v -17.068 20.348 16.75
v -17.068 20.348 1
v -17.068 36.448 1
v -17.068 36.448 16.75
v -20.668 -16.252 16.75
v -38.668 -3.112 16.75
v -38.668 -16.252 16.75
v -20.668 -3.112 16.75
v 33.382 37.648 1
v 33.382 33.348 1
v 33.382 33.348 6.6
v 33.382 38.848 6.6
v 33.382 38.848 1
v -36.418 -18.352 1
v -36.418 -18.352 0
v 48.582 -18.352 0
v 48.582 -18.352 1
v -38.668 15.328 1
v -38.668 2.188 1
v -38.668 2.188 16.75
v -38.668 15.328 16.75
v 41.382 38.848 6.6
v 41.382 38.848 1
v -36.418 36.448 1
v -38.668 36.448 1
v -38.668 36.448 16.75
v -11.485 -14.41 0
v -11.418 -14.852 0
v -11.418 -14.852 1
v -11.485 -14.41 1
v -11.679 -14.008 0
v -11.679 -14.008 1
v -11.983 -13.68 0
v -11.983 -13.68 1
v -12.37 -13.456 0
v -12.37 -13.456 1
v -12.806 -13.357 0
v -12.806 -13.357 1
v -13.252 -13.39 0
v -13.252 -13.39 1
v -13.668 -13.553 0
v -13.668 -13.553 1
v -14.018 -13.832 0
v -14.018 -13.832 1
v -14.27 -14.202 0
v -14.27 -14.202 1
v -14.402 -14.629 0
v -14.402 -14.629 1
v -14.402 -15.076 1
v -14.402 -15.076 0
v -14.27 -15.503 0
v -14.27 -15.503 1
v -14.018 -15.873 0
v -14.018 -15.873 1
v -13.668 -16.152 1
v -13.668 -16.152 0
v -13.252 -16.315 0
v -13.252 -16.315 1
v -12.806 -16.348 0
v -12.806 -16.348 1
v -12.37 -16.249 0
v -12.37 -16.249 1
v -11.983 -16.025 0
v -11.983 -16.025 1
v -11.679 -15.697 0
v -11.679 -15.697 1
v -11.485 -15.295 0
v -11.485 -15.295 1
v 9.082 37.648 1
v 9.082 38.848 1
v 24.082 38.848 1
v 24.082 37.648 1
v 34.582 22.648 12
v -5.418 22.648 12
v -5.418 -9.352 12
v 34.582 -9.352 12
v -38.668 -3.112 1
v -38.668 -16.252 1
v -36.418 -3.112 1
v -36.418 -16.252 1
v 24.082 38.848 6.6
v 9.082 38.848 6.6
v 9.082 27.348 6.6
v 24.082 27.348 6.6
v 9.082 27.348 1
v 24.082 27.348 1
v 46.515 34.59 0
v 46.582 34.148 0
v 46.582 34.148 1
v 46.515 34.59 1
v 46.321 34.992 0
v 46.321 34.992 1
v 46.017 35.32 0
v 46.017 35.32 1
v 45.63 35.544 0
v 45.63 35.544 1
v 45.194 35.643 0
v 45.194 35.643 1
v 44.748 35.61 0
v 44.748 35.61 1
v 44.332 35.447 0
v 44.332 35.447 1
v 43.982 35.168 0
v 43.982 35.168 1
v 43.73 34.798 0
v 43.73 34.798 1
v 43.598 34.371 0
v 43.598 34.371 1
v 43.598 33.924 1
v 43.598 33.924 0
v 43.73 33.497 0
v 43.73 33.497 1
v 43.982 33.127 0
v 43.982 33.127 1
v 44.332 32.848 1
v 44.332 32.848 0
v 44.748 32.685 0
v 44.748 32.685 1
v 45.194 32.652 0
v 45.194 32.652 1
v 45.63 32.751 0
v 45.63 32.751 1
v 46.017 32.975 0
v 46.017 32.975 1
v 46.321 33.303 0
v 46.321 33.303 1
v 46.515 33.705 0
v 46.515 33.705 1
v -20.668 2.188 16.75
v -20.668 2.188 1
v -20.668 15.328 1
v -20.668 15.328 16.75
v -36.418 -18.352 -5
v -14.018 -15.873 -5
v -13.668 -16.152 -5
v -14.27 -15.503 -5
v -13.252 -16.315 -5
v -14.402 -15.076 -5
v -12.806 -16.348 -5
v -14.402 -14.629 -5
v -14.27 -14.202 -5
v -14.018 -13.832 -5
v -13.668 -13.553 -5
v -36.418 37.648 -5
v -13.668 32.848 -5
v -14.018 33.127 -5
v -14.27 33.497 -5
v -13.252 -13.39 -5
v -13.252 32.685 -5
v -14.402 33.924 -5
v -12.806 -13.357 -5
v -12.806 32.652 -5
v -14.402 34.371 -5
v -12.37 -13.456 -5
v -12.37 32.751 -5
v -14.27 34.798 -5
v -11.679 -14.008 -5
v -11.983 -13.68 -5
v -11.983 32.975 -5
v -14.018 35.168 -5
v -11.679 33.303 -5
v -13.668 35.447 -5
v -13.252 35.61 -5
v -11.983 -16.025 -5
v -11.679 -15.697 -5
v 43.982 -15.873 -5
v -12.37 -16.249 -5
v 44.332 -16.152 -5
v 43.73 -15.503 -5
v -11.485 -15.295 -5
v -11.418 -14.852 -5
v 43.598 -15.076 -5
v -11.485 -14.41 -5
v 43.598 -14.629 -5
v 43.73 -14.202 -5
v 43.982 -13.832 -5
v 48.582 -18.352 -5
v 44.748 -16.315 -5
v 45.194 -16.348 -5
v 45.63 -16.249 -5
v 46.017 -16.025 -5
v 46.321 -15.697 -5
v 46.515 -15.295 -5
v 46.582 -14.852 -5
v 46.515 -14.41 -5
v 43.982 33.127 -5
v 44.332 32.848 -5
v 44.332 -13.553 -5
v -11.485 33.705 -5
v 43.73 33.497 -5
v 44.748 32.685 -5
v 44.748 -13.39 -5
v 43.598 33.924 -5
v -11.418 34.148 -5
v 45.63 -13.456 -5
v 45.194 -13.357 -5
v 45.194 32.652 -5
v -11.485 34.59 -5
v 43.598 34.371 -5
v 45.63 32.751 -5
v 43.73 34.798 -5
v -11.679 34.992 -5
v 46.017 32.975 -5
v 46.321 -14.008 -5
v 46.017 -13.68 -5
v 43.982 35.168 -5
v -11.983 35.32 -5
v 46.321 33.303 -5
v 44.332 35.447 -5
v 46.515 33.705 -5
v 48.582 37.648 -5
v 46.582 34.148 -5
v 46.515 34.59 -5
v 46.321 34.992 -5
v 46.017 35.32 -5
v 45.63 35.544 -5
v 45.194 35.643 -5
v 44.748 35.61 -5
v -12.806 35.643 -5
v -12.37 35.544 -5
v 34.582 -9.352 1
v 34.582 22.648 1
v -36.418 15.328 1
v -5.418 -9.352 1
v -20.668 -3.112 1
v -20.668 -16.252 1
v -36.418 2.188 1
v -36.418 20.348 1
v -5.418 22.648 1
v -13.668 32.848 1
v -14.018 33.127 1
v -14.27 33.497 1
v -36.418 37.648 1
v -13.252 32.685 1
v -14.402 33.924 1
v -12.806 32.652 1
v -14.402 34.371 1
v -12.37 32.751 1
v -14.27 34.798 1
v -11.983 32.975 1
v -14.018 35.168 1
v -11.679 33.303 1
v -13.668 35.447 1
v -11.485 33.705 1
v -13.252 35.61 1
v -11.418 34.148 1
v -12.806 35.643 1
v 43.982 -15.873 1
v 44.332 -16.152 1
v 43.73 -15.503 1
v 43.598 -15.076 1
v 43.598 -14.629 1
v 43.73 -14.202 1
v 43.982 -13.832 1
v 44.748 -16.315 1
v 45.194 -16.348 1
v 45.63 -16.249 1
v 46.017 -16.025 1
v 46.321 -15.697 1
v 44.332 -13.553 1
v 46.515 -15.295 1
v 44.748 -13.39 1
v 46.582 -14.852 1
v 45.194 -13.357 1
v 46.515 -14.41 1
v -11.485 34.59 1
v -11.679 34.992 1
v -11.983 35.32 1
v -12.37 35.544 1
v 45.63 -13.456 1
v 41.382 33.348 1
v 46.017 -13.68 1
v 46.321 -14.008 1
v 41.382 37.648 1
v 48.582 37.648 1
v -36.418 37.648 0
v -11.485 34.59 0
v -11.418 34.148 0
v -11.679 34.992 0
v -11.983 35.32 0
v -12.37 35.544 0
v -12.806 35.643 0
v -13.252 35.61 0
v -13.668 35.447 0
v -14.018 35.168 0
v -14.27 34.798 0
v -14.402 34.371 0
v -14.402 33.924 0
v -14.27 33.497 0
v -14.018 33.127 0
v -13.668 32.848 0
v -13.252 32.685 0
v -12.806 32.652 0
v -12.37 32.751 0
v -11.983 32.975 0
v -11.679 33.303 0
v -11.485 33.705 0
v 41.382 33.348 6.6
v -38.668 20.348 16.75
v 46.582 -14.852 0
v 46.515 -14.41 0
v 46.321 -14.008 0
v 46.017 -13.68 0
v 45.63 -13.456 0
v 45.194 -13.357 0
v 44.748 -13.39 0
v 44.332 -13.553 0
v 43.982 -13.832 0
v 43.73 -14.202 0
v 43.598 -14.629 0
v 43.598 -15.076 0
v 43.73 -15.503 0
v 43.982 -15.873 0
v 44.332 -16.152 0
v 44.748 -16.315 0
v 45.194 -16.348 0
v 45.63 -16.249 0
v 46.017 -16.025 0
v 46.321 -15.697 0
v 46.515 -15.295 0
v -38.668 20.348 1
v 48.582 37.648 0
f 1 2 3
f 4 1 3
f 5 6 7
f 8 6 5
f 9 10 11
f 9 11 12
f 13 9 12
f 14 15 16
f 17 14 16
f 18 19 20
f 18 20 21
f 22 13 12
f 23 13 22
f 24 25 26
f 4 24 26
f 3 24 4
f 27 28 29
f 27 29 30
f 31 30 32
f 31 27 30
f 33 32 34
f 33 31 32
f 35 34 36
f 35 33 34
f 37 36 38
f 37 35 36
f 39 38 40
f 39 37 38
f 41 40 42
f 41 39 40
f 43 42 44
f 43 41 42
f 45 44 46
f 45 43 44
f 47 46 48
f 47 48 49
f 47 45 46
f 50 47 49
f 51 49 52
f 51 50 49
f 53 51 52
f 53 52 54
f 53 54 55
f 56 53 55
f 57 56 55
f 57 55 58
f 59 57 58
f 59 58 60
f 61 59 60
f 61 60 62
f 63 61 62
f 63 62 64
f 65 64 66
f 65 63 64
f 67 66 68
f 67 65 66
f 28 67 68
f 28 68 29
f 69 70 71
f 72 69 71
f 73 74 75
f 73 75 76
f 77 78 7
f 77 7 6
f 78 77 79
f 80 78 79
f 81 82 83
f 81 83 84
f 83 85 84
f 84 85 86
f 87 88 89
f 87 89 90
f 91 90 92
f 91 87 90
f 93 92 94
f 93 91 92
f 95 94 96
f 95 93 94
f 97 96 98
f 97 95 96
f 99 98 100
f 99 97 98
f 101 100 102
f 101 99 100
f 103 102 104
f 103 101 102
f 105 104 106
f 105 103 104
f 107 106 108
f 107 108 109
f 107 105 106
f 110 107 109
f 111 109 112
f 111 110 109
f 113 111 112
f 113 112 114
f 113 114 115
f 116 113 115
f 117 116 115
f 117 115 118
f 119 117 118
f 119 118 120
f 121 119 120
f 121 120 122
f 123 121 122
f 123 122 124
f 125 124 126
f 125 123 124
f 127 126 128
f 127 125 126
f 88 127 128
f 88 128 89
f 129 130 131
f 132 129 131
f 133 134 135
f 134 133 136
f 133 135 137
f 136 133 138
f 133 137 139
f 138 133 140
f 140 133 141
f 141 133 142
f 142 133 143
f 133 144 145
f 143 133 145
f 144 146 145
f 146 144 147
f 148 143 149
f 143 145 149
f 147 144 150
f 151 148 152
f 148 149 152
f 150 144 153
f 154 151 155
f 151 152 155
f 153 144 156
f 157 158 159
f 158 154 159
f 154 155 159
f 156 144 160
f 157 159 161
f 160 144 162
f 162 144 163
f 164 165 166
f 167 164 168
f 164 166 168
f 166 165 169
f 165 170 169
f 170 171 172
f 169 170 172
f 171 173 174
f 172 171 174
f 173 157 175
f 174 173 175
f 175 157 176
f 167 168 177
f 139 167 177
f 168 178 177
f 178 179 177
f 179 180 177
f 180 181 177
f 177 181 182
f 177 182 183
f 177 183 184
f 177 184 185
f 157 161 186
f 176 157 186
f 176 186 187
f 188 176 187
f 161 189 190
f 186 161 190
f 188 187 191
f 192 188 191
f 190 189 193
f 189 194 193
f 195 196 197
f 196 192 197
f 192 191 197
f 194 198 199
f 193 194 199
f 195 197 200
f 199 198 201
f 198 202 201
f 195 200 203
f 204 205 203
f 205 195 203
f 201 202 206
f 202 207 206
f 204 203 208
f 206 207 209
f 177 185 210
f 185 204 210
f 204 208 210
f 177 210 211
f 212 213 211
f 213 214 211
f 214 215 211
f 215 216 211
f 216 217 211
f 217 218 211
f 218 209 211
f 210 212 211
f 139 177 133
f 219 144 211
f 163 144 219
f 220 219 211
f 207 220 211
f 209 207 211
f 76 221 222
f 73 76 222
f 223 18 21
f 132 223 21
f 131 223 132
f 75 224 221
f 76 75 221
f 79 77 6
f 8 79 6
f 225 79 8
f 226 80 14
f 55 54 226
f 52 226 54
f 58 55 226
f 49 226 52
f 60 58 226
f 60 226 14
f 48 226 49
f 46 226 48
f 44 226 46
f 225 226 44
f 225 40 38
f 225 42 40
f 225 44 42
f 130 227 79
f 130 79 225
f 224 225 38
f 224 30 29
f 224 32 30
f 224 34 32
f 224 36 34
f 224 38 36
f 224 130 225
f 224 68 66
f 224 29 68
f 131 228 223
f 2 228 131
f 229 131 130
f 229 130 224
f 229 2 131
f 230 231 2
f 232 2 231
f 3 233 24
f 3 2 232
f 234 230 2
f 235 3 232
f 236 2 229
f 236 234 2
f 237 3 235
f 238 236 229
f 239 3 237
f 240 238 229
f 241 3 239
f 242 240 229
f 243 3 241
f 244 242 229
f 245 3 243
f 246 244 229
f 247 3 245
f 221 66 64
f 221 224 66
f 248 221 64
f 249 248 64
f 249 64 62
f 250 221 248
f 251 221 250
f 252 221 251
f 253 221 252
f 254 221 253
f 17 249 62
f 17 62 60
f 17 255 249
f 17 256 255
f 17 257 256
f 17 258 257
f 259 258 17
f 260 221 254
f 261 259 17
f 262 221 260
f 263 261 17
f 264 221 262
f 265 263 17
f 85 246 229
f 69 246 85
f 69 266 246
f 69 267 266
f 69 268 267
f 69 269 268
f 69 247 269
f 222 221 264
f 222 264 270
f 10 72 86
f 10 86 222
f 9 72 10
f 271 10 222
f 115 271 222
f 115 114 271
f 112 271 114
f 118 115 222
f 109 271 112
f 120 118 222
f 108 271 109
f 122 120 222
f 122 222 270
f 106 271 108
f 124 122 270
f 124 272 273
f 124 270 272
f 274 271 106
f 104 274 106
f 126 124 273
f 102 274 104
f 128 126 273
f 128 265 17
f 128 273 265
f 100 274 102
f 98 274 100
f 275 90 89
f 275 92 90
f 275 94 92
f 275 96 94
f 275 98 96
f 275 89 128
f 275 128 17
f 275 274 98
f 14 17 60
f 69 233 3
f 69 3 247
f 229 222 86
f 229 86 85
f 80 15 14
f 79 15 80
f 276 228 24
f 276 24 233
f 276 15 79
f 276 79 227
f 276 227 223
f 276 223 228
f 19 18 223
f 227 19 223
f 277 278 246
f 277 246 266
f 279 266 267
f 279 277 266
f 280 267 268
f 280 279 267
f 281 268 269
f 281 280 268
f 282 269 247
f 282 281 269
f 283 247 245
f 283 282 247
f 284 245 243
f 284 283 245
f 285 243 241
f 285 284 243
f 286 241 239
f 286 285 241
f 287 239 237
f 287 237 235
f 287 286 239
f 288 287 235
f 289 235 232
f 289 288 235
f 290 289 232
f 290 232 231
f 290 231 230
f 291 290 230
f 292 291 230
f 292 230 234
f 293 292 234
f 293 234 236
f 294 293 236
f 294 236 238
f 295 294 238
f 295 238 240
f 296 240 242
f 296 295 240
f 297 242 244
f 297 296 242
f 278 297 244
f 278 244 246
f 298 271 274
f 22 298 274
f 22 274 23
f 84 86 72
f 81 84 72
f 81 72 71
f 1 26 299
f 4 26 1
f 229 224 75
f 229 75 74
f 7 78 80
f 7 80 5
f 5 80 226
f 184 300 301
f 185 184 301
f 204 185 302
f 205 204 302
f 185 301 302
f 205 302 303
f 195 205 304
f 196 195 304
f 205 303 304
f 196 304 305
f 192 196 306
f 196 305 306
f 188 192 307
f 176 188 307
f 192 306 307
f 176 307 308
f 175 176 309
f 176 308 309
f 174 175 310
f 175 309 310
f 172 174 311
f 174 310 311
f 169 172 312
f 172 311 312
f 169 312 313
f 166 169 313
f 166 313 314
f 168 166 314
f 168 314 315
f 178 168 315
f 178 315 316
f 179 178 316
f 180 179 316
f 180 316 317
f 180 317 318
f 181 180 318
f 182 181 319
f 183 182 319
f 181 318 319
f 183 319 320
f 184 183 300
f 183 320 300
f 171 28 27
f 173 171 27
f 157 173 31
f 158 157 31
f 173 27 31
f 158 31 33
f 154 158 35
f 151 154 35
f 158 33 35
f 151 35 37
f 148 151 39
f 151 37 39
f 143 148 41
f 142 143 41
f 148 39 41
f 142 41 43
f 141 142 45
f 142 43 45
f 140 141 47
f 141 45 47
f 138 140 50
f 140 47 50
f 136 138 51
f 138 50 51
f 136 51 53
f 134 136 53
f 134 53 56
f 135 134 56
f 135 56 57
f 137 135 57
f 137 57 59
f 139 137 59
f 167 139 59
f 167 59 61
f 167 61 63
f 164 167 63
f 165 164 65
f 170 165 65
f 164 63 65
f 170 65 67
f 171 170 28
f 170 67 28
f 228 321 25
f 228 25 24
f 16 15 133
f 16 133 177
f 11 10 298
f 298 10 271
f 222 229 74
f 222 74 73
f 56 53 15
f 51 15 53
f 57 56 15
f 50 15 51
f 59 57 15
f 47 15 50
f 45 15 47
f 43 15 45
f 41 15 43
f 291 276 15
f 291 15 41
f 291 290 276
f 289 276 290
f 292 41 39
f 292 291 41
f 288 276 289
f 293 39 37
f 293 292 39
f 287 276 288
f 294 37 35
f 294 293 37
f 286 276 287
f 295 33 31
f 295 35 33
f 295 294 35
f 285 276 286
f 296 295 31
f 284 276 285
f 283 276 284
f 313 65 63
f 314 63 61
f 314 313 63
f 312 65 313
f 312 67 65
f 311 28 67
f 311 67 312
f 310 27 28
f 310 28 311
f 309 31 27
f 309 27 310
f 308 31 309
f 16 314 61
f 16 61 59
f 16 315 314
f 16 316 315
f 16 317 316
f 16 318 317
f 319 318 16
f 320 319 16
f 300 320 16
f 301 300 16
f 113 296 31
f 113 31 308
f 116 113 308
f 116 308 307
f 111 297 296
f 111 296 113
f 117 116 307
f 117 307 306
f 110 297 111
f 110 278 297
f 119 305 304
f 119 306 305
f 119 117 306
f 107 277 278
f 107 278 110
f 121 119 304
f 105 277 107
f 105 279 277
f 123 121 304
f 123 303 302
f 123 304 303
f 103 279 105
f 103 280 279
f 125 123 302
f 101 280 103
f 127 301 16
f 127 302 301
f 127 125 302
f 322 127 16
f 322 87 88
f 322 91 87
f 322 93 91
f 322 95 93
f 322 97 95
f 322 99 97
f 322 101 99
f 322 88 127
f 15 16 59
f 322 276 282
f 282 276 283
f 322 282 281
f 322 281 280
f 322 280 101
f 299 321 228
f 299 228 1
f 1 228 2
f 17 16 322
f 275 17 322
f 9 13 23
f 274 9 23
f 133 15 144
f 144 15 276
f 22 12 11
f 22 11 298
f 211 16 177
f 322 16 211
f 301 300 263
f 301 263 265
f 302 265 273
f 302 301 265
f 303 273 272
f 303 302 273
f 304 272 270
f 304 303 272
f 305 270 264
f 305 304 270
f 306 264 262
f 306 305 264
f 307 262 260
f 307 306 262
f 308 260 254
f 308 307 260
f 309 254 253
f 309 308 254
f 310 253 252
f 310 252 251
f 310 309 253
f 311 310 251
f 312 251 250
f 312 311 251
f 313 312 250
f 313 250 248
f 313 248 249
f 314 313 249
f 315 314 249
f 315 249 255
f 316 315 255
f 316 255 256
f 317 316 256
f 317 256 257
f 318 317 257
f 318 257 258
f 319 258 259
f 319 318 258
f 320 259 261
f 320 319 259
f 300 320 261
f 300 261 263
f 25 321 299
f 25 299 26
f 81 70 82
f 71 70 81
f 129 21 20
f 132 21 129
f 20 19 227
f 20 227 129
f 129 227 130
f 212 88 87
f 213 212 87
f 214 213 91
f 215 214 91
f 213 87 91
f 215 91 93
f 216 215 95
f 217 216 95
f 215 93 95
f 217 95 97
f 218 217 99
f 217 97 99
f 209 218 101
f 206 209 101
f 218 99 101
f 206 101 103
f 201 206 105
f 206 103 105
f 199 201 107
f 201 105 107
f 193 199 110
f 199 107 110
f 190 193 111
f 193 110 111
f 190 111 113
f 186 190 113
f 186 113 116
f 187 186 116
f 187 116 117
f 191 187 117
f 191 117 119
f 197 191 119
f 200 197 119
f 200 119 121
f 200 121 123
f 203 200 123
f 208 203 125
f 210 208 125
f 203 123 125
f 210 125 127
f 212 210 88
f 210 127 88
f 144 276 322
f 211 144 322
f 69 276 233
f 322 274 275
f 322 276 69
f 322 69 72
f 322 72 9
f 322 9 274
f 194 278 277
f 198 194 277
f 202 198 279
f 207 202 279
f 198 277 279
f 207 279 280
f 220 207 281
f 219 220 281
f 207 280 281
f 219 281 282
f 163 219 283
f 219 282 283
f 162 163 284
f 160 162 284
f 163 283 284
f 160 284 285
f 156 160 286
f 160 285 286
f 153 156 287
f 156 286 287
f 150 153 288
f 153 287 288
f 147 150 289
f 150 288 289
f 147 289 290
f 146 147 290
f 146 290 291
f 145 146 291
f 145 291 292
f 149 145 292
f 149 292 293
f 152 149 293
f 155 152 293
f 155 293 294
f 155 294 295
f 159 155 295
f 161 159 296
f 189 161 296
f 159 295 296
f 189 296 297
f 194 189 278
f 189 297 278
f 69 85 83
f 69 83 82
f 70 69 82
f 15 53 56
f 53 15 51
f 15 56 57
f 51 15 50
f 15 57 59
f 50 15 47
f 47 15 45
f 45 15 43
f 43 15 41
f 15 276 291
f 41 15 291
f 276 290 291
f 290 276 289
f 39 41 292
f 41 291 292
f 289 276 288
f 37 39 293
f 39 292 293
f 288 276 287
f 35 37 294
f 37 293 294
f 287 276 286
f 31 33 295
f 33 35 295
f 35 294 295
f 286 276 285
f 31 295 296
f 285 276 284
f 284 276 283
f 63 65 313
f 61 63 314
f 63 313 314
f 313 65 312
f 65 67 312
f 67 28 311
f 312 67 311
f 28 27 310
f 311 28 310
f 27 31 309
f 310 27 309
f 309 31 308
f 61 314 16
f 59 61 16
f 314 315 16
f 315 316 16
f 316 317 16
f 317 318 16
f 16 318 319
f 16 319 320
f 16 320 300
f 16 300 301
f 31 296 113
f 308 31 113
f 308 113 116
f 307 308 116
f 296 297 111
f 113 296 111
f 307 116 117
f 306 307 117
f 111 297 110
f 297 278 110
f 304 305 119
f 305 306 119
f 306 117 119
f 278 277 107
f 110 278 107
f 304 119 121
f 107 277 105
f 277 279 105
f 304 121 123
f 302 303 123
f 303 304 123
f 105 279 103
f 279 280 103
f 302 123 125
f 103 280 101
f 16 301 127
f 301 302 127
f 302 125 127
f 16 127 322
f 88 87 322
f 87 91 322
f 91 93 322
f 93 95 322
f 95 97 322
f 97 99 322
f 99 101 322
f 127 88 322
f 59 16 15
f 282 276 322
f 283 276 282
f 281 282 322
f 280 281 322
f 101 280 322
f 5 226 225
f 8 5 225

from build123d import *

# Parameters (mm, degrees)
SKETCH1_W           = 85
SKETCH1_H           = 56
SKETCH1_R           = 1.5
BOSS_EXTRUDE1_DEPTH = 1
SKETCH1_2_W         = 85
SKETCH1_2_H         = 56
SKETCH1_2_R         = 1.5
BOSS_EXTRUDE2_DEPTH = 5
SKETCH3_W           = 40
SKETCH3_H           = 32
BOSS_EXTRUDE3_DEPTH = 11
SKETCH4_W           = 18
SKETCH4_H           = 13.14
SKETCH4_W_2         = 21.6
SKETCH4_H_2         = 16.1
BOSS_EXTRUDE4_DEPTH = 15.75
SKETCH5_W           = 15
SKETCH5_H           = 11.5
SKETCH5_W_2         = 8
SKETCH5_H_2         = 5.5
BOSS_EXTRUDE5_DEPTH = 5.6


with BuildPart() as part:
    # Sketch1 → Boss-Extrude1 (new body)
    with BuildSketch(Plane.XY):
        with Locations((6.081574074, 9.647501164)):
            Rectangle(SKETCH1_W, SKETCH1_H)
        with Locations((-12.918426004, 34.147501164)):
            Circle(SKETCH1_R, mode=Mode.SUBTRACT)
        with Locations((-12.918426004, -14.852498836)):
            Circle(SKETCH1_R, mode=Mode.SUBTRACT)
        with Locations((45.081574074, 34.147501164)):
            Circle(SKETCH1_R, mode=Mode.SUBTRACT)
        with Locations((45.081574074, -14.852498836)):
            Circle(SKETCH1_R, mode=Mode.SUBTRACT)
    extrude(amount=BOSS_EXTRUDE1_DEPTH)

    # Sketch3 → Boss-Extrude3 (add)
    with BuildSketch(Plane.XY.offset(1)):
        with Locations((14.581574074, 6.647501164)):
            Rectangle(SKETCH3_W, SKETCH3_H)
    extrude(amount=BOSS_EXTRUDE3_DEPTH)

    # Sketch4 → Boss-Extrude4 (add)
    with BuildSketch(Plane.XY.offset(1)):
        with Locations((-29.667902016, 8.757501164)):
            Rectangle(SKETCH4_W, SKETCH4_H)
        with Locations((-29.667902016, -9.682498836)):
            Rectangle(SKETCH4_W, SKETCH4_H)
        with Locations((-27.867902016, 28.397501164)):
            Rectangle(SKETCH4_W_2, SKETCH4_H_2)
    extrude(amount=BOSS_EXTRUDE4_DEPTH)

    # Sketch5 → Boss-Extrude5 (add)
    with BuildSketch(Plane.XY.offset(1)):
        with Locations((16.581574074, 33.097501164)):
            Rectangle(SKETCH5_W, SKETCH5_H)
        with Locations((37.381574074, 36.097501164)):
            Rectangle(SKETCH5_W_2, SKETCH5_H_2)
    extrude(amount=BOSS_EXTRUDE5_DEPTH)


with BuildPart() as body_2:
    # Sketch1<2> → Boss-Extrude2 (new body)
    with BuildSketch(Plane.XY):
        with Locations((6.081574074, 9.647501164)):
            Rectangle(SKETCH1_2_W, SKETCH1_2_H)
        with Locations((-12.918426004, 34.147501164)):
            Circle(SKETCH1_2_R, mode=Mode.SUBTRACT)
        with Locations((-12.918426004, -14.852498836)):
            Circle(SKETCH1_2_R, mode=Mode.SUBTRACT)
        with Locations((45.081574074, 34.147501164)):
            Circle(SKETCH1_2_R, mode=Mode.SUBTRACT)
        with Locations((45.081574074, -14.852498836)):
            Circle(SKETCH1_2_R, mode=Mode.SUBTRACT)
    extrude(amount=-BOSS_EXTRUDE2_DEPTH)


solid = Compound([part.part, body_2.part])
